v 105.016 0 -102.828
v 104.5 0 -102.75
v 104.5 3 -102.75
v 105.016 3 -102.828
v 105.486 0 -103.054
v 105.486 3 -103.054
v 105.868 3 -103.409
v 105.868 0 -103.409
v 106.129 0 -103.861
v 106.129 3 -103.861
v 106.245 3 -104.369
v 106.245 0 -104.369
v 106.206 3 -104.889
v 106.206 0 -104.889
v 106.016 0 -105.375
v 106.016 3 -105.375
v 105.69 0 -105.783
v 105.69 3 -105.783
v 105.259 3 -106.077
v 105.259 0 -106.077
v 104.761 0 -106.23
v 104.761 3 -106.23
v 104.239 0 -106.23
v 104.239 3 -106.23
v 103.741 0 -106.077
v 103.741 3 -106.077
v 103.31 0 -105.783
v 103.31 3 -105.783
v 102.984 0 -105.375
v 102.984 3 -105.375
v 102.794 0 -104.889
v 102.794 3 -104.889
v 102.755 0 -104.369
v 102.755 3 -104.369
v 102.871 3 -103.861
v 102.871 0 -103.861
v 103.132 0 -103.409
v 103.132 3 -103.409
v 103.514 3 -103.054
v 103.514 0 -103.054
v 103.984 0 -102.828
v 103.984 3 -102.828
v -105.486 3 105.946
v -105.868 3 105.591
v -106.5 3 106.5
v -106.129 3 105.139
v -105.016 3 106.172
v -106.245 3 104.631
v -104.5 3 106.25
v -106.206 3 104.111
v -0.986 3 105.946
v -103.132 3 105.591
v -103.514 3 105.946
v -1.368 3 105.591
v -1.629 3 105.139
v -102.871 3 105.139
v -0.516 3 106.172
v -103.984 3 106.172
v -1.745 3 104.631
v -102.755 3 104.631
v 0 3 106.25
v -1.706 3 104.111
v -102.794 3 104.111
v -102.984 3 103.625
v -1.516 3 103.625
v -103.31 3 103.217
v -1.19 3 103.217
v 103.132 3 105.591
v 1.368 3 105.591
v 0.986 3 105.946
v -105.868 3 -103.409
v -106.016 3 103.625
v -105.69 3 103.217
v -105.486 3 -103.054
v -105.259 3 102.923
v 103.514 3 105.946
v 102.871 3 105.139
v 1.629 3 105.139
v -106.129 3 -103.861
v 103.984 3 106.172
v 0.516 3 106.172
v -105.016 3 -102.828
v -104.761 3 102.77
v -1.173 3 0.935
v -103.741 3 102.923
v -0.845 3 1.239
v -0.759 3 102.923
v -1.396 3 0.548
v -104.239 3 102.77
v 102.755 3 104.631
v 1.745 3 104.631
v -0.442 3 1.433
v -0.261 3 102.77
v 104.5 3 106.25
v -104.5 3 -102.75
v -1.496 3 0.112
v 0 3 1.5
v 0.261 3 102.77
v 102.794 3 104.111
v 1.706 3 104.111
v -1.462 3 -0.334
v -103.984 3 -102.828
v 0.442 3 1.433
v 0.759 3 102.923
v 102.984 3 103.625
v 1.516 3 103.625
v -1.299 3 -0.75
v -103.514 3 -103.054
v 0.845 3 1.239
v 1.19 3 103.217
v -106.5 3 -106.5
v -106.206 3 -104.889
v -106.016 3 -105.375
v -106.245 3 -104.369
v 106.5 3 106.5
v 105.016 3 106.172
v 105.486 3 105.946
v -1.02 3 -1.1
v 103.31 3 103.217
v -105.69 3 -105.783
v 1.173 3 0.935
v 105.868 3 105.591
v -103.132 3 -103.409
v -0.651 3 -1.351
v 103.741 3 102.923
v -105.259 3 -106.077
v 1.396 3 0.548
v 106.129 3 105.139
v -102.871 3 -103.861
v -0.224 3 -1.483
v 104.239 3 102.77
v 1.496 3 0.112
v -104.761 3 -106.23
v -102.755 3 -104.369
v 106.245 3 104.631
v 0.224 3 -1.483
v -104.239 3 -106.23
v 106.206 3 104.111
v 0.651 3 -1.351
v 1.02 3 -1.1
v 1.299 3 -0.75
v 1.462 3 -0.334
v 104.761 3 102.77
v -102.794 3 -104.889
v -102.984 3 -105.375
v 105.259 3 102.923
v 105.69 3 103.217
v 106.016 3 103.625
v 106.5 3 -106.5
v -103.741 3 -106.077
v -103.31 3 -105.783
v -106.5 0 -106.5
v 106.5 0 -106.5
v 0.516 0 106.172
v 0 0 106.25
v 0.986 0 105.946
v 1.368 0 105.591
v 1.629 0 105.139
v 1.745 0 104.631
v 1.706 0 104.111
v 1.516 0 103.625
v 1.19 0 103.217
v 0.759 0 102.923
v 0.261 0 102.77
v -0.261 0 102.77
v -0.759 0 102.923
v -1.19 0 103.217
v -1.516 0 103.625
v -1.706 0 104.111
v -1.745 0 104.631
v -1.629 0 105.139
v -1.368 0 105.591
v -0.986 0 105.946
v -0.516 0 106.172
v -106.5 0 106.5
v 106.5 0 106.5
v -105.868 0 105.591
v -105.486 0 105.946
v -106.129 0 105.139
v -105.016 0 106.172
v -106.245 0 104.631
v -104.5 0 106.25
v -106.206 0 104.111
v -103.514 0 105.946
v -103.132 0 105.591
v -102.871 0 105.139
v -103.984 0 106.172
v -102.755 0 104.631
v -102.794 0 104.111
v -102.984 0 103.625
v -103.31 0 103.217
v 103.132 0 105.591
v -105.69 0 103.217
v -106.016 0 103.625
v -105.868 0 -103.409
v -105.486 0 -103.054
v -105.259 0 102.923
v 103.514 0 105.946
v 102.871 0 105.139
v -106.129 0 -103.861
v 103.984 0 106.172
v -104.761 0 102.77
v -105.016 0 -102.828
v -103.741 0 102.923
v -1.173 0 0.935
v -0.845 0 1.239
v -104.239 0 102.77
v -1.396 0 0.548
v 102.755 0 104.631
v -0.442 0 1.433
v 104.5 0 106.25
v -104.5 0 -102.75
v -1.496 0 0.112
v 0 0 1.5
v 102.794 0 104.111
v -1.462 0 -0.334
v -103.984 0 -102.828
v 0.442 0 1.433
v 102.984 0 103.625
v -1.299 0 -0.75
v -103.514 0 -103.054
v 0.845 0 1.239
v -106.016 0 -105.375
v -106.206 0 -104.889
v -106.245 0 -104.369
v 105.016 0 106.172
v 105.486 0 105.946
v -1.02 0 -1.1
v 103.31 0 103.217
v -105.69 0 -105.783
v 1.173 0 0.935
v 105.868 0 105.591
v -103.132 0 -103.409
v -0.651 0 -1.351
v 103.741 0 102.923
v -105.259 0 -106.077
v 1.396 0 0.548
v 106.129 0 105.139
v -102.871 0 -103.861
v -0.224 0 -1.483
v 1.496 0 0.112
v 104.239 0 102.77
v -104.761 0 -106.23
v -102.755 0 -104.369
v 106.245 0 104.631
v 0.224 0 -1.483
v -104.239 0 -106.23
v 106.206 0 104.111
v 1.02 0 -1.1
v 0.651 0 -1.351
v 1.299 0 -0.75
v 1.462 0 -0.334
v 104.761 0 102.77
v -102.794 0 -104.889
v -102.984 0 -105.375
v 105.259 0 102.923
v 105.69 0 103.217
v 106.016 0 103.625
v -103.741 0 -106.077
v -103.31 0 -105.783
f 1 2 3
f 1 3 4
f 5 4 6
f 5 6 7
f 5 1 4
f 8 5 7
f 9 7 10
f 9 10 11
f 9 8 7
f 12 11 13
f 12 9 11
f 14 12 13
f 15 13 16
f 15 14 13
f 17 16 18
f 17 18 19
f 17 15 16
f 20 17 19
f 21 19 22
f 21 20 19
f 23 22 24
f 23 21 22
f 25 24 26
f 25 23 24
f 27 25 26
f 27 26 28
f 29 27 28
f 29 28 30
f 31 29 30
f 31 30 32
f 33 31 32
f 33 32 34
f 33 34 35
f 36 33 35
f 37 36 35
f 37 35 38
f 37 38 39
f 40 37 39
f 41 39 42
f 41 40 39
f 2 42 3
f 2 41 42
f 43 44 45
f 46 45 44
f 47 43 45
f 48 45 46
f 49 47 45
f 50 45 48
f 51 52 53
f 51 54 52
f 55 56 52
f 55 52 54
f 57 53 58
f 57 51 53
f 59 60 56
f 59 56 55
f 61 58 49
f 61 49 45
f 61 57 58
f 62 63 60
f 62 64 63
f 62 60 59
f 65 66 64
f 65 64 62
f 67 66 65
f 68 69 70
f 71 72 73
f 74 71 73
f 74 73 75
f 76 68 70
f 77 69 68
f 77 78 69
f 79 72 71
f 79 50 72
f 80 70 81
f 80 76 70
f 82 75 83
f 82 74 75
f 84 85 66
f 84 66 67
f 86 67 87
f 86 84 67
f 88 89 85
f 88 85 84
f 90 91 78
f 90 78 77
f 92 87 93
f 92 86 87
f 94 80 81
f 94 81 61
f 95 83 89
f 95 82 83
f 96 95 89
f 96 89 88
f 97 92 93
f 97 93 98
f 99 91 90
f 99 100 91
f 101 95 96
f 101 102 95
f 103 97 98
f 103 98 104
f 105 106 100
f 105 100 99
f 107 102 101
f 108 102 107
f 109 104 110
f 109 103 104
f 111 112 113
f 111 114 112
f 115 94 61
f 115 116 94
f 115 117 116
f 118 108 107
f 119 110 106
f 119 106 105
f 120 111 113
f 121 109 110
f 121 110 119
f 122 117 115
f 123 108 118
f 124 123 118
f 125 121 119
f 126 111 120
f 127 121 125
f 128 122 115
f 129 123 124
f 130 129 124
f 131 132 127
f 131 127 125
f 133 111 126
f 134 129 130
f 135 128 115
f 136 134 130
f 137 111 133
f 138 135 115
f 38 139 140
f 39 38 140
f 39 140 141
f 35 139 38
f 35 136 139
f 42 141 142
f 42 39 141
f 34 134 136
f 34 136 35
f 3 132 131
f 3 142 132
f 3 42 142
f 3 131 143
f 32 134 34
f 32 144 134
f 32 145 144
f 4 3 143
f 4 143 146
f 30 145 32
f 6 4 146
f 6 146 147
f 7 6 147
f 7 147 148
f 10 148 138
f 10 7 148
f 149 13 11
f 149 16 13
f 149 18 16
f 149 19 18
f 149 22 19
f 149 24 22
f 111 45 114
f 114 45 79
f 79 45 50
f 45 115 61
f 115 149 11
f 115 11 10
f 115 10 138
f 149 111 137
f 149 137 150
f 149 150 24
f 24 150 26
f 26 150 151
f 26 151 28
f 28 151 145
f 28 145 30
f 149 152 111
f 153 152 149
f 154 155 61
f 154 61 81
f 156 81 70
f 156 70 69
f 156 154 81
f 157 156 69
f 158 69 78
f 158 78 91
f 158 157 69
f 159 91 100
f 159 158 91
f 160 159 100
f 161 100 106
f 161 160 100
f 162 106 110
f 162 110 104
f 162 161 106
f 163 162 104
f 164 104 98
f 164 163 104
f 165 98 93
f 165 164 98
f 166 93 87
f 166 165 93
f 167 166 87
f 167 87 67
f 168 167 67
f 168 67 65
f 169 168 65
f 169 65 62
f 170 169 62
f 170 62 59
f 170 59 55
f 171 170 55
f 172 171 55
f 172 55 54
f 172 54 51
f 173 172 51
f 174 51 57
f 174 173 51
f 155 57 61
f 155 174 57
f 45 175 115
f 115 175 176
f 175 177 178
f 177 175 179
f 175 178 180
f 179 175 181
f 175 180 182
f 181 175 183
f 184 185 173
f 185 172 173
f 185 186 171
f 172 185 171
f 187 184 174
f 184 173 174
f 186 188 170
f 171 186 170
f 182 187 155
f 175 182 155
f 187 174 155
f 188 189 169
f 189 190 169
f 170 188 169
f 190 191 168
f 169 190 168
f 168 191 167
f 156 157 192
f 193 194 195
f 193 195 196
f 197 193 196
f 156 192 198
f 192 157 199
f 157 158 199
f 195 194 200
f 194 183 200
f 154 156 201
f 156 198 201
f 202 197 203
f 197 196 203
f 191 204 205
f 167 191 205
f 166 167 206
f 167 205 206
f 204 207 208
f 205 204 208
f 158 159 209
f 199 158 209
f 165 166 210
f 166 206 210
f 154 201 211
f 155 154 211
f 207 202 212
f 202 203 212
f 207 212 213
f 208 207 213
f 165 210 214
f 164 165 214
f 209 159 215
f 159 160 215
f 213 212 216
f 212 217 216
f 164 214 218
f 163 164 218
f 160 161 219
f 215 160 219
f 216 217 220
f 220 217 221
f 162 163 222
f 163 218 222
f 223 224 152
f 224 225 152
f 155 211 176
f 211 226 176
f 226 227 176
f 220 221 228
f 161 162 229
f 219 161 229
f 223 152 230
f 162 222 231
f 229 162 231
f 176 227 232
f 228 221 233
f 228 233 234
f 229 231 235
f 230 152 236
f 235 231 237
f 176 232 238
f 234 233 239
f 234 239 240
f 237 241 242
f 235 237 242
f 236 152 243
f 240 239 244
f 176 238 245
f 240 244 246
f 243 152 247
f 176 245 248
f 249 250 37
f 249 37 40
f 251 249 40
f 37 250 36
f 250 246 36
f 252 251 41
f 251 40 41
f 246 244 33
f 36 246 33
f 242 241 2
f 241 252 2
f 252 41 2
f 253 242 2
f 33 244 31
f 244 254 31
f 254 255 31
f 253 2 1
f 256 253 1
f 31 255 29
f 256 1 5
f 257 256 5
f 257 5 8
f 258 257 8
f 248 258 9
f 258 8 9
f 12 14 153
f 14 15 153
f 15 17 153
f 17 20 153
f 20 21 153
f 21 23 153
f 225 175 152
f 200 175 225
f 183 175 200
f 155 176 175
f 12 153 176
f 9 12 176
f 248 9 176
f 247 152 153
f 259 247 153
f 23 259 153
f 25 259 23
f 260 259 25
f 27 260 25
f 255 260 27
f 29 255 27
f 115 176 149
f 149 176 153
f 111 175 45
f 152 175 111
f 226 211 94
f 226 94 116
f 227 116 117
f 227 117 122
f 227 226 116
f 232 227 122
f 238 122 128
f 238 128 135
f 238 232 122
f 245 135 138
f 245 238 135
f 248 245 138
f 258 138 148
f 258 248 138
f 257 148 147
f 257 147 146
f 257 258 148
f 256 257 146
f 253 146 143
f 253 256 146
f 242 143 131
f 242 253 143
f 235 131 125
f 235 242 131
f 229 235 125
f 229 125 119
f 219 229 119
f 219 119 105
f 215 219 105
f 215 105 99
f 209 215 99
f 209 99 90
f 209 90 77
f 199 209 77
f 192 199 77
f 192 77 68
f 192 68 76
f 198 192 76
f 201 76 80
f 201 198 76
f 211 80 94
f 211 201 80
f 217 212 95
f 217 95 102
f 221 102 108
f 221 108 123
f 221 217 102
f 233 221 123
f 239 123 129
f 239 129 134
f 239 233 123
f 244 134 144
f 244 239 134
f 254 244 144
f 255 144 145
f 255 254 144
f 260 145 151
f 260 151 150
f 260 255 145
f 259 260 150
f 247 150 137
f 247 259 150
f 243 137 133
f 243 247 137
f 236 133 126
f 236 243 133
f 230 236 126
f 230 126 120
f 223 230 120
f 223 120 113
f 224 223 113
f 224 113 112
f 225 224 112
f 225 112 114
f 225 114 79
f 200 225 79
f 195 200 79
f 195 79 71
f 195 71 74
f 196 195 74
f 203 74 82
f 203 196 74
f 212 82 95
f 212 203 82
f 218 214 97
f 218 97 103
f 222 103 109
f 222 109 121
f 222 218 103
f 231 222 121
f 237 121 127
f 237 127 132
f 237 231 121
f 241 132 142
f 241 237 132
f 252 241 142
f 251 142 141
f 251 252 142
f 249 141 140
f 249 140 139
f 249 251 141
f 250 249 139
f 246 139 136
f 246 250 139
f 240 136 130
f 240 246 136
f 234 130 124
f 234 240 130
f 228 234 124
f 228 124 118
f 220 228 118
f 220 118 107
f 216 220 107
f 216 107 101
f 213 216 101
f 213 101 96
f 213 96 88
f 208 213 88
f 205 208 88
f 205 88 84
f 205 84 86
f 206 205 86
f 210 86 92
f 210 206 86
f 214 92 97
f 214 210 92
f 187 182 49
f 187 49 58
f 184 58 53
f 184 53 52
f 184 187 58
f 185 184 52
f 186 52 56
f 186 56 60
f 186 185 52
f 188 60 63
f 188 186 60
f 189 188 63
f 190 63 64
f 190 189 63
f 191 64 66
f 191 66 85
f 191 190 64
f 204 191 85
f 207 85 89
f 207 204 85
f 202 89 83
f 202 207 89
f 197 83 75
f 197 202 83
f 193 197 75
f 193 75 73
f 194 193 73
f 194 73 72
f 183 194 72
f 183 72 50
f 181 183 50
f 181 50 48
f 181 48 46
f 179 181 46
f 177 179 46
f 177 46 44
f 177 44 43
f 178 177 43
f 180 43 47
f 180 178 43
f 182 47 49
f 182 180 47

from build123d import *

# Parameters (mm, degrees)
SKETCH1_W           = 213
SKETCH1_H           = 213
SKETCH1_R           = 1.75
SKETCH1_R_2         = 1.5
BOSS_EXTRUDE1_DEPTH = 3


with BuildPart() as part:
    # Sketch1 → Boss-Extrude1 (new body)
    with BuildSketch(Plane(origin=(0, 0, 0), x_dir=(1, 0, 0), z_dir=(0, 1, 0))):
        Rectangle(SKETCH1_W, SKETCH1_H)
        with Locations(Location((-104.5, 104.5, 0), (0, 0, 270))):
            Circle(SKETCH1_R, mode=Mode.SUBTRACT)
        with Locations(Location((104.5, 104.5, 0), (0, 0, 270))):
            Circle(SKETCH1_R, mode=Mode.SUBTRACT)
        with Locations(Location((-104.5, -104.5, 0), (0, 0, 270))):
            Circle(SKETCH1_R, mode=Mode.SUBTRACT)
        with Locations(Location((104.5, -104.5, 0), (0, 0, 270))):
            Circle(SKETCH1_R, mode=Mode.SUBTRACT)
        with Locations(Location((0, -104.5, 0), (0, 0, 270))):
            Circle(SKETCH1_R, mode=Mode.SUBTRACT)
        with Locations(Location((0, 0, 0), (0, 0, 270))):
            Circle(SKETCH1_R_2, mode=Mode.SUBTRACT)
    extrude(amount=BOSS_EXTRUDE1_DEPTH)


solid = part.part
